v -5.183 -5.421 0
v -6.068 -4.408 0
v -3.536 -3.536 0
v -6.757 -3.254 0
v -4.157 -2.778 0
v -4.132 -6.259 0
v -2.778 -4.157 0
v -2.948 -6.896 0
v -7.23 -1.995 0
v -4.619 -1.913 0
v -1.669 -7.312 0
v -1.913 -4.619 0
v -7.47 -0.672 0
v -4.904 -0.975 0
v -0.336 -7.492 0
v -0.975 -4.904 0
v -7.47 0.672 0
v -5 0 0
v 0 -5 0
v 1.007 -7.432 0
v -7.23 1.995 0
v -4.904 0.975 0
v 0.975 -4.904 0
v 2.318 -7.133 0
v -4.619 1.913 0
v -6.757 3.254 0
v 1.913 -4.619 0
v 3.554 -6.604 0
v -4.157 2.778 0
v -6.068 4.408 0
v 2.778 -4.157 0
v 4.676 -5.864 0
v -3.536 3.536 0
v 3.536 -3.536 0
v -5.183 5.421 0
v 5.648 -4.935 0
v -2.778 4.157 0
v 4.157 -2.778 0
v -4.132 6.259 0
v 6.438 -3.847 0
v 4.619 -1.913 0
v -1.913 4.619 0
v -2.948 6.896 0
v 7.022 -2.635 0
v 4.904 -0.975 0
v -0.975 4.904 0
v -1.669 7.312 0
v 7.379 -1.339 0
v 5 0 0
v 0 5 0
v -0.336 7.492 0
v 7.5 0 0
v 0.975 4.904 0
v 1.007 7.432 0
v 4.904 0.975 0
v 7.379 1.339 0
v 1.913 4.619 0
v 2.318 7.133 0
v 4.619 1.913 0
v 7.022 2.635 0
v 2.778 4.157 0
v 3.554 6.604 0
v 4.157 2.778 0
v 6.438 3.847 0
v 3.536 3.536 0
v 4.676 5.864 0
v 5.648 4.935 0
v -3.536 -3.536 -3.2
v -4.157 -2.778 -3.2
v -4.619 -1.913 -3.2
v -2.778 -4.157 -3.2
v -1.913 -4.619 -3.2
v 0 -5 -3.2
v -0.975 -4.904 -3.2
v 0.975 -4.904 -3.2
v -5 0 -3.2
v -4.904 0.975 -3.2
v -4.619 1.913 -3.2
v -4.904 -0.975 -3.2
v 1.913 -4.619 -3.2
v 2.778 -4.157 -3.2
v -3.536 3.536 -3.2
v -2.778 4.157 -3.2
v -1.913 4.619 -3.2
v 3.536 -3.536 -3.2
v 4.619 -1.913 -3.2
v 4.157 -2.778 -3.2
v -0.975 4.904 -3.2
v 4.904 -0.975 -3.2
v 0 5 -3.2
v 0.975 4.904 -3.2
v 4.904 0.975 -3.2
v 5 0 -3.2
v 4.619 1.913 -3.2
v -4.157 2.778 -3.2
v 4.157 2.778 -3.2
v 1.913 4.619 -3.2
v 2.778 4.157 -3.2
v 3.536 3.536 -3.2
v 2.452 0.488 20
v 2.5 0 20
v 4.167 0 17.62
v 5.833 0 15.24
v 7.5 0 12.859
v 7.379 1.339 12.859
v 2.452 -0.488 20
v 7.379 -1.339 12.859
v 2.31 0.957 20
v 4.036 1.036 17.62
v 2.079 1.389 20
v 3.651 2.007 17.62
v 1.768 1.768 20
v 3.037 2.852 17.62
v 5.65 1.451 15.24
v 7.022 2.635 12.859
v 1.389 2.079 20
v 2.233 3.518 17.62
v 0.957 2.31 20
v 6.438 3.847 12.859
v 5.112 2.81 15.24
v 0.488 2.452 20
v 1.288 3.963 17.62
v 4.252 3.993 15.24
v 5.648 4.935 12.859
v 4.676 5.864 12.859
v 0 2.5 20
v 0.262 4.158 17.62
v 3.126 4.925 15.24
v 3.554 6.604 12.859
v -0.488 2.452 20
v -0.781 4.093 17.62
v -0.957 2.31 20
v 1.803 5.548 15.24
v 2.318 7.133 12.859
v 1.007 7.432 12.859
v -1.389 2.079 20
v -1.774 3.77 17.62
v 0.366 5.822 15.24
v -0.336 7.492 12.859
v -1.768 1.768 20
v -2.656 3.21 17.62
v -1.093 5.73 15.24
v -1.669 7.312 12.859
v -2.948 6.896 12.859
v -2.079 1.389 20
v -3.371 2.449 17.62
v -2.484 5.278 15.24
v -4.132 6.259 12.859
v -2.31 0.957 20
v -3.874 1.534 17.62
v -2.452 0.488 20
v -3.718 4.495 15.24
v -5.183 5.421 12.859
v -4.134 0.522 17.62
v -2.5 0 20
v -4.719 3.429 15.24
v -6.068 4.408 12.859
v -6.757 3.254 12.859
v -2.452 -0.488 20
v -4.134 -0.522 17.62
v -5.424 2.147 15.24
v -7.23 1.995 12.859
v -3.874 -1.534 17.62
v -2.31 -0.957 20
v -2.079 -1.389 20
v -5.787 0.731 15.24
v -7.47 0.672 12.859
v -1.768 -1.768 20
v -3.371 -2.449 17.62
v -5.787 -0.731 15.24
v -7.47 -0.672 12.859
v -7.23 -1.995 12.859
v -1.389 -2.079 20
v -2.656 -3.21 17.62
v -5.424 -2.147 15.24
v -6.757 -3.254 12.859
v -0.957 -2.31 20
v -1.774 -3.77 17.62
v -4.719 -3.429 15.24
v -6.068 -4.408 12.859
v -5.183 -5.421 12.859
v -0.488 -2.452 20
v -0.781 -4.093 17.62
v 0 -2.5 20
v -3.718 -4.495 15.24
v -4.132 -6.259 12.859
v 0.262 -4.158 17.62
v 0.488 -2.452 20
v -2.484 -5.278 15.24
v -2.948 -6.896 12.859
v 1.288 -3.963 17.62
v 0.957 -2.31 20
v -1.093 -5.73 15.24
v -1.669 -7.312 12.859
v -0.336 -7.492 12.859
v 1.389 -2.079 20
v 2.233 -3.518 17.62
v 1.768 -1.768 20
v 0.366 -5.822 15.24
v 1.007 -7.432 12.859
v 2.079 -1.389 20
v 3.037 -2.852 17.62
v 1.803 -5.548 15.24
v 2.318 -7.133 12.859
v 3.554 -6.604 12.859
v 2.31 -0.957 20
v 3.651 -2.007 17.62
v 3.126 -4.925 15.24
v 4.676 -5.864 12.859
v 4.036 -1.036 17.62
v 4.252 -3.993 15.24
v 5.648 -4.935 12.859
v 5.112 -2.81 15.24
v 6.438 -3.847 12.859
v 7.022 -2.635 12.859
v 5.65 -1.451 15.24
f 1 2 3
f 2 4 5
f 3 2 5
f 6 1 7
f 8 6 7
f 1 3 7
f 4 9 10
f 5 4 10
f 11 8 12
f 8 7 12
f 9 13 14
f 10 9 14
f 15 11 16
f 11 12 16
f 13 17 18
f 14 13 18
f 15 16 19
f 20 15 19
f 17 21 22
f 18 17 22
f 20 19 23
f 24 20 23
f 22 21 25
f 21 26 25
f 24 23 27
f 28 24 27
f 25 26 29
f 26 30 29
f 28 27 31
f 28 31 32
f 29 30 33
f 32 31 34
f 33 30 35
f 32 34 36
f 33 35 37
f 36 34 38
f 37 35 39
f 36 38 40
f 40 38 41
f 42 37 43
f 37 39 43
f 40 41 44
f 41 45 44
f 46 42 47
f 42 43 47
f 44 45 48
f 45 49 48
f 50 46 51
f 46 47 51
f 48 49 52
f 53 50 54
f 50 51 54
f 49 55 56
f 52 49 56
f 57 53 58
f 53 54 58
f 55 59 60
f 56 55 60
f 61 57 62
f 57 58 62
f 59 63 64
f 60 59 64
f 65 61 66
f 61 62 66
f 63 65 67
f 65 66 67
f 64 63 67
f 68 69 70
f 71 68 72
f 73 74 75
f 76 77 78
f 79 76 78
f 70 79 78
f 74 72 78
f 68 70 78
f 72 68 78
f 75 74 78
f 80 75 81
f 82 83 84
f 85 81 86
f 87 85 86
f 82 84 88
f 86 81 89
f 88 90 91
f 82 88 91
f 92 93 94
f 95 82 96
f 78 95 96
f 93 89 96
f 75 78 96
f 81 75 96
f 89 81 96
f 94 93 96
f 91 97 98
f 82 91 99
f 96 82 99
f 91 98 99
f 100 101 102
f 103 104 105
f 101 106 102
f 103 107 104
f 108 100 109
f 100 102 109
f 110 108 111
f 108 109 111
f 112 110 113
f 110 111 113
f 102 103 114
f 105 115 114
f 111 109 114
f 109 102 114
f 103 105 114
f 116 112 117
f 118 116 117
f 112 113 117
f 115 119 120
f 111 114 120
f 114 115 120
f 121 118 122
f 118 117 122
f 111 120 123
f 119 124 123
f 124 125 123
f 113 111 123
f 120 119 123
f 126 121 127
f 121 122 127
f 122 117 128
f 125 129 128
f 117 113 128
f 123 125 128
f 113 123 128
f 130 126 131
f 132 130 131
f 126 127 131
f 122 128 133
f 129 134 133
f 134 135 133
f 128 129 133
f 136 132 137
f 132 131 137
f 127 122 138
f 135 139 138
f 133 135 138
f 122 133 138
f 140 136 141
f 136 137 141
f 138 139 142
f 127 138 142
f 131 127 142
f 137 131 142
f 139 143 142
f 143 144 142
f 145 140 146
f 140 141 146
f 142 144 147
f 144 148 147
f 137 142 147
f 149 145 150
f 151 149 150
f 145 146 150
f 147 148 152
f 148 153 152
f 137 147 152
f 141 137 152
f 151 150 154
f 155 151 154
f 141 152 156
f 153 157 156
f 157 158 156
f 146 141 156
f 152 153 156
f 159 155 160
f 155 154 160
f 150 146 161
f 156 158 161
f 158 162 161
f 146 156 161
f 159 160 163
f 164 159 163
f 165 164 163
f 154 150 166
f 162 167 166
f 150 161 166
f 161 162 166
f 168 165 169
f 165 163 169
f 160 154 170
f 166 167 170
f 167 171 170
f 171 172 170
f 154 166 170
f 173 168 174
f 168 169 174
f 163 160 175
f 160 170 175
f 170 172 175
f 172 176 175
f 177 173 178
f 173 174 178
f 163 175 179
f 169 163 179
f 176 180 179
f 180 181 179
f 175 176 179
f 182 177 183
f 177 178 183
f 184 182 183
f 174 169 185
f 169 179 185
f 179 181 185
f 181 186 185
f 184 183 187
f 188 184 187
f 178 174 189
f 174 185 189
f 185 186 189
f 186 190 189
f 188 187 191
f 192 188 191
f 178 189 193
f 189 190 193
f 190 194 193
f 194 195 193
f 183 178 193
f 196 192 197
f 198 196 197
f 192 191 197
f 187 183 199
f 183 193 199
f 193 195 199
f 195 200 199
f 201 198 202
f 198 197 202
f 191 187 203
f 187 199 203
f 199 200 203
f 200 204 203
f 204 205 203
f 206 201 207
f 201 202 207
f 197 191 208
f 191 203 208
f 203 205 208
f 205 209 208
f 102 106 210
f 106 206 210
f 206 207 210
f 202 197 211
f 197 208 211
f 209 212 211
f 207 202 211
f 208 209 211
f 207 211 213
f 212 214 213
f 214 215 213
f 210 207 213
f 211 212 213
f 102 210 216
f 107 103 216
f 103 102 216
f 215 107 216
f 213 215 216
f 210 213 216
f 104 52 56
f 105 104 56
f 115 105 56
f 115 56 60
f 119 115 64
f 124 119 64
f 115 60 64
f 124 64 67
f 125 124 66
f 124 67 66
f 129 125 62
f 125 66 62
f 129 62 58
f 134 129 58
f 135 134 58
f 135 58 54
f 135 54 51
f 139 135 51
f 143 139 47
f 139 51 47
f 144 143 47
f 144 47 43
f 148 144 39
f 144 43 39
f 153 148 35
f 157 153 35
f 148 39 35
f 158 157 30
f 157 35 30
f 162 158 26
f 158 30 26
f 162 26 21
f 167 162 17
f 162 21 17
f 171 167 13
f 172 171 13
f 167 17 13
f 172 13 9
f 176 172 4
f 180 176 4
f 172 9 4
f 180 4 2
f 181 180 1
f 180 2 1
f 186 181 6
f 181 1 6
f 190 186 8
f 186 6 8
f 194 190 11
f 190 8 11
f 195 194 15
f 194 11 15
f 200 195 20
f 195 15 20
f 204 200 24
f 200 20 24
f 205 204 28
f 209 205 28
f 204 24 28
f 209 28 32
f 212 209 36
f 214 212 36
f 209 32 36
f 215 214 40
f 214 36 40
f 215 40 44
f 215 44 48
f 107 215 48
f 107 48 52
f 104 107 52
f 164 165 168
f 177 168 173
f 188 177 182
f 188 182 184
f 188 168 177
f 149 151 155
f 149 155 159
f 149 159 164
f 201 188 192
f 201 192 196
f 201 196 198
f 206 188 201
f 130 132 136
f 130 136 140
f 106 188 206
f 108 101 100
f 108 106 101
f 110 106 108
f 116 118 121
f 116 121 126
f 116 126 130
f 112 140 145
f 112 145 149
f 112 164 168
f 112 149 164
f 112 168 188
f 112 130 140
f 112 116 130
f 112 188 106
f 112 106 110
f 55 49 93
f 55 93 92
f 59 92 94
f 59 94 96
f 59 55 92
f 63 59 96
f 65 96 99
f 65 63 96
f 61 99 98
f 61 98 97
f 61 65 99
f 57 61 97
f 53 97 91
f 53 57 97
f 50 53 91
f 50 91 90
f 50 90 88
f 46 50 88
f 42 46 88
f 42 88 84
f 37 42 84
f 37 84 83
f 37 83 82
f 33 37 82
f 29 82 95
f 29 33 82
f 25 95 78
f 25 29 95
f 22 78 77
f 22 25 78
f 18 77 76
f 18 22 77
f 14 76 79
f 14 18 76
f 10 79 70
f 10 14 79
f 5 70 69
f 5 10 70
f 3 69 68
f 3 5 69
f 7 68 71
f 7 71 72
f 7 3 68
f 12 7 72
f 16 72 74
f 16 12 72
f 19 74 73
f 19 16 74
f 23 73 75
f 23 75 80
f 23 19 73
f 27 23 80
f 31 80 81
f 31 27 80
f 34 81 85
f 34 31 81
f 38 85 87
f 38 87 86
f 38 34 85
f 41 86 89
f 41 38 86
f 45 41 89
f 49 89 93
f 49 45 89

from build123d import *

# Parameters (mm, degrees)
F0_R     = 7.5
F1_DEPTH = 20
F2_SIZE2 = 7.1407400337
F2_SIZE  = 5
F3_R     = 5
F4_DEPTH = 3.2


with BuildPart() as f1:
    # F0 (on Top) → F1 (new body)
    with BuildSketch(Plane.XY):
        Circle(F0_R)
    extrude(amount=F1_DEPTH)

    # F2
    f2_edges = [f1.edges().sort_by_distance(p)[0] for p in [
        (-7.5, 0, 20),
    ]]
    f2_side = f1.faces().sort_by_distance((0, 0, 20))[0]
    chamfer(f2_edges, length=F2_SIZE, length2=F2_SIZE2, reference=f2_side)

    # F3 (on Top) → F4 (join)
    with BuildSketch(Plane.XY):
        Circle(F3_R)
    extrude(amount=-F4_DEPTH)


solid = f1.part
